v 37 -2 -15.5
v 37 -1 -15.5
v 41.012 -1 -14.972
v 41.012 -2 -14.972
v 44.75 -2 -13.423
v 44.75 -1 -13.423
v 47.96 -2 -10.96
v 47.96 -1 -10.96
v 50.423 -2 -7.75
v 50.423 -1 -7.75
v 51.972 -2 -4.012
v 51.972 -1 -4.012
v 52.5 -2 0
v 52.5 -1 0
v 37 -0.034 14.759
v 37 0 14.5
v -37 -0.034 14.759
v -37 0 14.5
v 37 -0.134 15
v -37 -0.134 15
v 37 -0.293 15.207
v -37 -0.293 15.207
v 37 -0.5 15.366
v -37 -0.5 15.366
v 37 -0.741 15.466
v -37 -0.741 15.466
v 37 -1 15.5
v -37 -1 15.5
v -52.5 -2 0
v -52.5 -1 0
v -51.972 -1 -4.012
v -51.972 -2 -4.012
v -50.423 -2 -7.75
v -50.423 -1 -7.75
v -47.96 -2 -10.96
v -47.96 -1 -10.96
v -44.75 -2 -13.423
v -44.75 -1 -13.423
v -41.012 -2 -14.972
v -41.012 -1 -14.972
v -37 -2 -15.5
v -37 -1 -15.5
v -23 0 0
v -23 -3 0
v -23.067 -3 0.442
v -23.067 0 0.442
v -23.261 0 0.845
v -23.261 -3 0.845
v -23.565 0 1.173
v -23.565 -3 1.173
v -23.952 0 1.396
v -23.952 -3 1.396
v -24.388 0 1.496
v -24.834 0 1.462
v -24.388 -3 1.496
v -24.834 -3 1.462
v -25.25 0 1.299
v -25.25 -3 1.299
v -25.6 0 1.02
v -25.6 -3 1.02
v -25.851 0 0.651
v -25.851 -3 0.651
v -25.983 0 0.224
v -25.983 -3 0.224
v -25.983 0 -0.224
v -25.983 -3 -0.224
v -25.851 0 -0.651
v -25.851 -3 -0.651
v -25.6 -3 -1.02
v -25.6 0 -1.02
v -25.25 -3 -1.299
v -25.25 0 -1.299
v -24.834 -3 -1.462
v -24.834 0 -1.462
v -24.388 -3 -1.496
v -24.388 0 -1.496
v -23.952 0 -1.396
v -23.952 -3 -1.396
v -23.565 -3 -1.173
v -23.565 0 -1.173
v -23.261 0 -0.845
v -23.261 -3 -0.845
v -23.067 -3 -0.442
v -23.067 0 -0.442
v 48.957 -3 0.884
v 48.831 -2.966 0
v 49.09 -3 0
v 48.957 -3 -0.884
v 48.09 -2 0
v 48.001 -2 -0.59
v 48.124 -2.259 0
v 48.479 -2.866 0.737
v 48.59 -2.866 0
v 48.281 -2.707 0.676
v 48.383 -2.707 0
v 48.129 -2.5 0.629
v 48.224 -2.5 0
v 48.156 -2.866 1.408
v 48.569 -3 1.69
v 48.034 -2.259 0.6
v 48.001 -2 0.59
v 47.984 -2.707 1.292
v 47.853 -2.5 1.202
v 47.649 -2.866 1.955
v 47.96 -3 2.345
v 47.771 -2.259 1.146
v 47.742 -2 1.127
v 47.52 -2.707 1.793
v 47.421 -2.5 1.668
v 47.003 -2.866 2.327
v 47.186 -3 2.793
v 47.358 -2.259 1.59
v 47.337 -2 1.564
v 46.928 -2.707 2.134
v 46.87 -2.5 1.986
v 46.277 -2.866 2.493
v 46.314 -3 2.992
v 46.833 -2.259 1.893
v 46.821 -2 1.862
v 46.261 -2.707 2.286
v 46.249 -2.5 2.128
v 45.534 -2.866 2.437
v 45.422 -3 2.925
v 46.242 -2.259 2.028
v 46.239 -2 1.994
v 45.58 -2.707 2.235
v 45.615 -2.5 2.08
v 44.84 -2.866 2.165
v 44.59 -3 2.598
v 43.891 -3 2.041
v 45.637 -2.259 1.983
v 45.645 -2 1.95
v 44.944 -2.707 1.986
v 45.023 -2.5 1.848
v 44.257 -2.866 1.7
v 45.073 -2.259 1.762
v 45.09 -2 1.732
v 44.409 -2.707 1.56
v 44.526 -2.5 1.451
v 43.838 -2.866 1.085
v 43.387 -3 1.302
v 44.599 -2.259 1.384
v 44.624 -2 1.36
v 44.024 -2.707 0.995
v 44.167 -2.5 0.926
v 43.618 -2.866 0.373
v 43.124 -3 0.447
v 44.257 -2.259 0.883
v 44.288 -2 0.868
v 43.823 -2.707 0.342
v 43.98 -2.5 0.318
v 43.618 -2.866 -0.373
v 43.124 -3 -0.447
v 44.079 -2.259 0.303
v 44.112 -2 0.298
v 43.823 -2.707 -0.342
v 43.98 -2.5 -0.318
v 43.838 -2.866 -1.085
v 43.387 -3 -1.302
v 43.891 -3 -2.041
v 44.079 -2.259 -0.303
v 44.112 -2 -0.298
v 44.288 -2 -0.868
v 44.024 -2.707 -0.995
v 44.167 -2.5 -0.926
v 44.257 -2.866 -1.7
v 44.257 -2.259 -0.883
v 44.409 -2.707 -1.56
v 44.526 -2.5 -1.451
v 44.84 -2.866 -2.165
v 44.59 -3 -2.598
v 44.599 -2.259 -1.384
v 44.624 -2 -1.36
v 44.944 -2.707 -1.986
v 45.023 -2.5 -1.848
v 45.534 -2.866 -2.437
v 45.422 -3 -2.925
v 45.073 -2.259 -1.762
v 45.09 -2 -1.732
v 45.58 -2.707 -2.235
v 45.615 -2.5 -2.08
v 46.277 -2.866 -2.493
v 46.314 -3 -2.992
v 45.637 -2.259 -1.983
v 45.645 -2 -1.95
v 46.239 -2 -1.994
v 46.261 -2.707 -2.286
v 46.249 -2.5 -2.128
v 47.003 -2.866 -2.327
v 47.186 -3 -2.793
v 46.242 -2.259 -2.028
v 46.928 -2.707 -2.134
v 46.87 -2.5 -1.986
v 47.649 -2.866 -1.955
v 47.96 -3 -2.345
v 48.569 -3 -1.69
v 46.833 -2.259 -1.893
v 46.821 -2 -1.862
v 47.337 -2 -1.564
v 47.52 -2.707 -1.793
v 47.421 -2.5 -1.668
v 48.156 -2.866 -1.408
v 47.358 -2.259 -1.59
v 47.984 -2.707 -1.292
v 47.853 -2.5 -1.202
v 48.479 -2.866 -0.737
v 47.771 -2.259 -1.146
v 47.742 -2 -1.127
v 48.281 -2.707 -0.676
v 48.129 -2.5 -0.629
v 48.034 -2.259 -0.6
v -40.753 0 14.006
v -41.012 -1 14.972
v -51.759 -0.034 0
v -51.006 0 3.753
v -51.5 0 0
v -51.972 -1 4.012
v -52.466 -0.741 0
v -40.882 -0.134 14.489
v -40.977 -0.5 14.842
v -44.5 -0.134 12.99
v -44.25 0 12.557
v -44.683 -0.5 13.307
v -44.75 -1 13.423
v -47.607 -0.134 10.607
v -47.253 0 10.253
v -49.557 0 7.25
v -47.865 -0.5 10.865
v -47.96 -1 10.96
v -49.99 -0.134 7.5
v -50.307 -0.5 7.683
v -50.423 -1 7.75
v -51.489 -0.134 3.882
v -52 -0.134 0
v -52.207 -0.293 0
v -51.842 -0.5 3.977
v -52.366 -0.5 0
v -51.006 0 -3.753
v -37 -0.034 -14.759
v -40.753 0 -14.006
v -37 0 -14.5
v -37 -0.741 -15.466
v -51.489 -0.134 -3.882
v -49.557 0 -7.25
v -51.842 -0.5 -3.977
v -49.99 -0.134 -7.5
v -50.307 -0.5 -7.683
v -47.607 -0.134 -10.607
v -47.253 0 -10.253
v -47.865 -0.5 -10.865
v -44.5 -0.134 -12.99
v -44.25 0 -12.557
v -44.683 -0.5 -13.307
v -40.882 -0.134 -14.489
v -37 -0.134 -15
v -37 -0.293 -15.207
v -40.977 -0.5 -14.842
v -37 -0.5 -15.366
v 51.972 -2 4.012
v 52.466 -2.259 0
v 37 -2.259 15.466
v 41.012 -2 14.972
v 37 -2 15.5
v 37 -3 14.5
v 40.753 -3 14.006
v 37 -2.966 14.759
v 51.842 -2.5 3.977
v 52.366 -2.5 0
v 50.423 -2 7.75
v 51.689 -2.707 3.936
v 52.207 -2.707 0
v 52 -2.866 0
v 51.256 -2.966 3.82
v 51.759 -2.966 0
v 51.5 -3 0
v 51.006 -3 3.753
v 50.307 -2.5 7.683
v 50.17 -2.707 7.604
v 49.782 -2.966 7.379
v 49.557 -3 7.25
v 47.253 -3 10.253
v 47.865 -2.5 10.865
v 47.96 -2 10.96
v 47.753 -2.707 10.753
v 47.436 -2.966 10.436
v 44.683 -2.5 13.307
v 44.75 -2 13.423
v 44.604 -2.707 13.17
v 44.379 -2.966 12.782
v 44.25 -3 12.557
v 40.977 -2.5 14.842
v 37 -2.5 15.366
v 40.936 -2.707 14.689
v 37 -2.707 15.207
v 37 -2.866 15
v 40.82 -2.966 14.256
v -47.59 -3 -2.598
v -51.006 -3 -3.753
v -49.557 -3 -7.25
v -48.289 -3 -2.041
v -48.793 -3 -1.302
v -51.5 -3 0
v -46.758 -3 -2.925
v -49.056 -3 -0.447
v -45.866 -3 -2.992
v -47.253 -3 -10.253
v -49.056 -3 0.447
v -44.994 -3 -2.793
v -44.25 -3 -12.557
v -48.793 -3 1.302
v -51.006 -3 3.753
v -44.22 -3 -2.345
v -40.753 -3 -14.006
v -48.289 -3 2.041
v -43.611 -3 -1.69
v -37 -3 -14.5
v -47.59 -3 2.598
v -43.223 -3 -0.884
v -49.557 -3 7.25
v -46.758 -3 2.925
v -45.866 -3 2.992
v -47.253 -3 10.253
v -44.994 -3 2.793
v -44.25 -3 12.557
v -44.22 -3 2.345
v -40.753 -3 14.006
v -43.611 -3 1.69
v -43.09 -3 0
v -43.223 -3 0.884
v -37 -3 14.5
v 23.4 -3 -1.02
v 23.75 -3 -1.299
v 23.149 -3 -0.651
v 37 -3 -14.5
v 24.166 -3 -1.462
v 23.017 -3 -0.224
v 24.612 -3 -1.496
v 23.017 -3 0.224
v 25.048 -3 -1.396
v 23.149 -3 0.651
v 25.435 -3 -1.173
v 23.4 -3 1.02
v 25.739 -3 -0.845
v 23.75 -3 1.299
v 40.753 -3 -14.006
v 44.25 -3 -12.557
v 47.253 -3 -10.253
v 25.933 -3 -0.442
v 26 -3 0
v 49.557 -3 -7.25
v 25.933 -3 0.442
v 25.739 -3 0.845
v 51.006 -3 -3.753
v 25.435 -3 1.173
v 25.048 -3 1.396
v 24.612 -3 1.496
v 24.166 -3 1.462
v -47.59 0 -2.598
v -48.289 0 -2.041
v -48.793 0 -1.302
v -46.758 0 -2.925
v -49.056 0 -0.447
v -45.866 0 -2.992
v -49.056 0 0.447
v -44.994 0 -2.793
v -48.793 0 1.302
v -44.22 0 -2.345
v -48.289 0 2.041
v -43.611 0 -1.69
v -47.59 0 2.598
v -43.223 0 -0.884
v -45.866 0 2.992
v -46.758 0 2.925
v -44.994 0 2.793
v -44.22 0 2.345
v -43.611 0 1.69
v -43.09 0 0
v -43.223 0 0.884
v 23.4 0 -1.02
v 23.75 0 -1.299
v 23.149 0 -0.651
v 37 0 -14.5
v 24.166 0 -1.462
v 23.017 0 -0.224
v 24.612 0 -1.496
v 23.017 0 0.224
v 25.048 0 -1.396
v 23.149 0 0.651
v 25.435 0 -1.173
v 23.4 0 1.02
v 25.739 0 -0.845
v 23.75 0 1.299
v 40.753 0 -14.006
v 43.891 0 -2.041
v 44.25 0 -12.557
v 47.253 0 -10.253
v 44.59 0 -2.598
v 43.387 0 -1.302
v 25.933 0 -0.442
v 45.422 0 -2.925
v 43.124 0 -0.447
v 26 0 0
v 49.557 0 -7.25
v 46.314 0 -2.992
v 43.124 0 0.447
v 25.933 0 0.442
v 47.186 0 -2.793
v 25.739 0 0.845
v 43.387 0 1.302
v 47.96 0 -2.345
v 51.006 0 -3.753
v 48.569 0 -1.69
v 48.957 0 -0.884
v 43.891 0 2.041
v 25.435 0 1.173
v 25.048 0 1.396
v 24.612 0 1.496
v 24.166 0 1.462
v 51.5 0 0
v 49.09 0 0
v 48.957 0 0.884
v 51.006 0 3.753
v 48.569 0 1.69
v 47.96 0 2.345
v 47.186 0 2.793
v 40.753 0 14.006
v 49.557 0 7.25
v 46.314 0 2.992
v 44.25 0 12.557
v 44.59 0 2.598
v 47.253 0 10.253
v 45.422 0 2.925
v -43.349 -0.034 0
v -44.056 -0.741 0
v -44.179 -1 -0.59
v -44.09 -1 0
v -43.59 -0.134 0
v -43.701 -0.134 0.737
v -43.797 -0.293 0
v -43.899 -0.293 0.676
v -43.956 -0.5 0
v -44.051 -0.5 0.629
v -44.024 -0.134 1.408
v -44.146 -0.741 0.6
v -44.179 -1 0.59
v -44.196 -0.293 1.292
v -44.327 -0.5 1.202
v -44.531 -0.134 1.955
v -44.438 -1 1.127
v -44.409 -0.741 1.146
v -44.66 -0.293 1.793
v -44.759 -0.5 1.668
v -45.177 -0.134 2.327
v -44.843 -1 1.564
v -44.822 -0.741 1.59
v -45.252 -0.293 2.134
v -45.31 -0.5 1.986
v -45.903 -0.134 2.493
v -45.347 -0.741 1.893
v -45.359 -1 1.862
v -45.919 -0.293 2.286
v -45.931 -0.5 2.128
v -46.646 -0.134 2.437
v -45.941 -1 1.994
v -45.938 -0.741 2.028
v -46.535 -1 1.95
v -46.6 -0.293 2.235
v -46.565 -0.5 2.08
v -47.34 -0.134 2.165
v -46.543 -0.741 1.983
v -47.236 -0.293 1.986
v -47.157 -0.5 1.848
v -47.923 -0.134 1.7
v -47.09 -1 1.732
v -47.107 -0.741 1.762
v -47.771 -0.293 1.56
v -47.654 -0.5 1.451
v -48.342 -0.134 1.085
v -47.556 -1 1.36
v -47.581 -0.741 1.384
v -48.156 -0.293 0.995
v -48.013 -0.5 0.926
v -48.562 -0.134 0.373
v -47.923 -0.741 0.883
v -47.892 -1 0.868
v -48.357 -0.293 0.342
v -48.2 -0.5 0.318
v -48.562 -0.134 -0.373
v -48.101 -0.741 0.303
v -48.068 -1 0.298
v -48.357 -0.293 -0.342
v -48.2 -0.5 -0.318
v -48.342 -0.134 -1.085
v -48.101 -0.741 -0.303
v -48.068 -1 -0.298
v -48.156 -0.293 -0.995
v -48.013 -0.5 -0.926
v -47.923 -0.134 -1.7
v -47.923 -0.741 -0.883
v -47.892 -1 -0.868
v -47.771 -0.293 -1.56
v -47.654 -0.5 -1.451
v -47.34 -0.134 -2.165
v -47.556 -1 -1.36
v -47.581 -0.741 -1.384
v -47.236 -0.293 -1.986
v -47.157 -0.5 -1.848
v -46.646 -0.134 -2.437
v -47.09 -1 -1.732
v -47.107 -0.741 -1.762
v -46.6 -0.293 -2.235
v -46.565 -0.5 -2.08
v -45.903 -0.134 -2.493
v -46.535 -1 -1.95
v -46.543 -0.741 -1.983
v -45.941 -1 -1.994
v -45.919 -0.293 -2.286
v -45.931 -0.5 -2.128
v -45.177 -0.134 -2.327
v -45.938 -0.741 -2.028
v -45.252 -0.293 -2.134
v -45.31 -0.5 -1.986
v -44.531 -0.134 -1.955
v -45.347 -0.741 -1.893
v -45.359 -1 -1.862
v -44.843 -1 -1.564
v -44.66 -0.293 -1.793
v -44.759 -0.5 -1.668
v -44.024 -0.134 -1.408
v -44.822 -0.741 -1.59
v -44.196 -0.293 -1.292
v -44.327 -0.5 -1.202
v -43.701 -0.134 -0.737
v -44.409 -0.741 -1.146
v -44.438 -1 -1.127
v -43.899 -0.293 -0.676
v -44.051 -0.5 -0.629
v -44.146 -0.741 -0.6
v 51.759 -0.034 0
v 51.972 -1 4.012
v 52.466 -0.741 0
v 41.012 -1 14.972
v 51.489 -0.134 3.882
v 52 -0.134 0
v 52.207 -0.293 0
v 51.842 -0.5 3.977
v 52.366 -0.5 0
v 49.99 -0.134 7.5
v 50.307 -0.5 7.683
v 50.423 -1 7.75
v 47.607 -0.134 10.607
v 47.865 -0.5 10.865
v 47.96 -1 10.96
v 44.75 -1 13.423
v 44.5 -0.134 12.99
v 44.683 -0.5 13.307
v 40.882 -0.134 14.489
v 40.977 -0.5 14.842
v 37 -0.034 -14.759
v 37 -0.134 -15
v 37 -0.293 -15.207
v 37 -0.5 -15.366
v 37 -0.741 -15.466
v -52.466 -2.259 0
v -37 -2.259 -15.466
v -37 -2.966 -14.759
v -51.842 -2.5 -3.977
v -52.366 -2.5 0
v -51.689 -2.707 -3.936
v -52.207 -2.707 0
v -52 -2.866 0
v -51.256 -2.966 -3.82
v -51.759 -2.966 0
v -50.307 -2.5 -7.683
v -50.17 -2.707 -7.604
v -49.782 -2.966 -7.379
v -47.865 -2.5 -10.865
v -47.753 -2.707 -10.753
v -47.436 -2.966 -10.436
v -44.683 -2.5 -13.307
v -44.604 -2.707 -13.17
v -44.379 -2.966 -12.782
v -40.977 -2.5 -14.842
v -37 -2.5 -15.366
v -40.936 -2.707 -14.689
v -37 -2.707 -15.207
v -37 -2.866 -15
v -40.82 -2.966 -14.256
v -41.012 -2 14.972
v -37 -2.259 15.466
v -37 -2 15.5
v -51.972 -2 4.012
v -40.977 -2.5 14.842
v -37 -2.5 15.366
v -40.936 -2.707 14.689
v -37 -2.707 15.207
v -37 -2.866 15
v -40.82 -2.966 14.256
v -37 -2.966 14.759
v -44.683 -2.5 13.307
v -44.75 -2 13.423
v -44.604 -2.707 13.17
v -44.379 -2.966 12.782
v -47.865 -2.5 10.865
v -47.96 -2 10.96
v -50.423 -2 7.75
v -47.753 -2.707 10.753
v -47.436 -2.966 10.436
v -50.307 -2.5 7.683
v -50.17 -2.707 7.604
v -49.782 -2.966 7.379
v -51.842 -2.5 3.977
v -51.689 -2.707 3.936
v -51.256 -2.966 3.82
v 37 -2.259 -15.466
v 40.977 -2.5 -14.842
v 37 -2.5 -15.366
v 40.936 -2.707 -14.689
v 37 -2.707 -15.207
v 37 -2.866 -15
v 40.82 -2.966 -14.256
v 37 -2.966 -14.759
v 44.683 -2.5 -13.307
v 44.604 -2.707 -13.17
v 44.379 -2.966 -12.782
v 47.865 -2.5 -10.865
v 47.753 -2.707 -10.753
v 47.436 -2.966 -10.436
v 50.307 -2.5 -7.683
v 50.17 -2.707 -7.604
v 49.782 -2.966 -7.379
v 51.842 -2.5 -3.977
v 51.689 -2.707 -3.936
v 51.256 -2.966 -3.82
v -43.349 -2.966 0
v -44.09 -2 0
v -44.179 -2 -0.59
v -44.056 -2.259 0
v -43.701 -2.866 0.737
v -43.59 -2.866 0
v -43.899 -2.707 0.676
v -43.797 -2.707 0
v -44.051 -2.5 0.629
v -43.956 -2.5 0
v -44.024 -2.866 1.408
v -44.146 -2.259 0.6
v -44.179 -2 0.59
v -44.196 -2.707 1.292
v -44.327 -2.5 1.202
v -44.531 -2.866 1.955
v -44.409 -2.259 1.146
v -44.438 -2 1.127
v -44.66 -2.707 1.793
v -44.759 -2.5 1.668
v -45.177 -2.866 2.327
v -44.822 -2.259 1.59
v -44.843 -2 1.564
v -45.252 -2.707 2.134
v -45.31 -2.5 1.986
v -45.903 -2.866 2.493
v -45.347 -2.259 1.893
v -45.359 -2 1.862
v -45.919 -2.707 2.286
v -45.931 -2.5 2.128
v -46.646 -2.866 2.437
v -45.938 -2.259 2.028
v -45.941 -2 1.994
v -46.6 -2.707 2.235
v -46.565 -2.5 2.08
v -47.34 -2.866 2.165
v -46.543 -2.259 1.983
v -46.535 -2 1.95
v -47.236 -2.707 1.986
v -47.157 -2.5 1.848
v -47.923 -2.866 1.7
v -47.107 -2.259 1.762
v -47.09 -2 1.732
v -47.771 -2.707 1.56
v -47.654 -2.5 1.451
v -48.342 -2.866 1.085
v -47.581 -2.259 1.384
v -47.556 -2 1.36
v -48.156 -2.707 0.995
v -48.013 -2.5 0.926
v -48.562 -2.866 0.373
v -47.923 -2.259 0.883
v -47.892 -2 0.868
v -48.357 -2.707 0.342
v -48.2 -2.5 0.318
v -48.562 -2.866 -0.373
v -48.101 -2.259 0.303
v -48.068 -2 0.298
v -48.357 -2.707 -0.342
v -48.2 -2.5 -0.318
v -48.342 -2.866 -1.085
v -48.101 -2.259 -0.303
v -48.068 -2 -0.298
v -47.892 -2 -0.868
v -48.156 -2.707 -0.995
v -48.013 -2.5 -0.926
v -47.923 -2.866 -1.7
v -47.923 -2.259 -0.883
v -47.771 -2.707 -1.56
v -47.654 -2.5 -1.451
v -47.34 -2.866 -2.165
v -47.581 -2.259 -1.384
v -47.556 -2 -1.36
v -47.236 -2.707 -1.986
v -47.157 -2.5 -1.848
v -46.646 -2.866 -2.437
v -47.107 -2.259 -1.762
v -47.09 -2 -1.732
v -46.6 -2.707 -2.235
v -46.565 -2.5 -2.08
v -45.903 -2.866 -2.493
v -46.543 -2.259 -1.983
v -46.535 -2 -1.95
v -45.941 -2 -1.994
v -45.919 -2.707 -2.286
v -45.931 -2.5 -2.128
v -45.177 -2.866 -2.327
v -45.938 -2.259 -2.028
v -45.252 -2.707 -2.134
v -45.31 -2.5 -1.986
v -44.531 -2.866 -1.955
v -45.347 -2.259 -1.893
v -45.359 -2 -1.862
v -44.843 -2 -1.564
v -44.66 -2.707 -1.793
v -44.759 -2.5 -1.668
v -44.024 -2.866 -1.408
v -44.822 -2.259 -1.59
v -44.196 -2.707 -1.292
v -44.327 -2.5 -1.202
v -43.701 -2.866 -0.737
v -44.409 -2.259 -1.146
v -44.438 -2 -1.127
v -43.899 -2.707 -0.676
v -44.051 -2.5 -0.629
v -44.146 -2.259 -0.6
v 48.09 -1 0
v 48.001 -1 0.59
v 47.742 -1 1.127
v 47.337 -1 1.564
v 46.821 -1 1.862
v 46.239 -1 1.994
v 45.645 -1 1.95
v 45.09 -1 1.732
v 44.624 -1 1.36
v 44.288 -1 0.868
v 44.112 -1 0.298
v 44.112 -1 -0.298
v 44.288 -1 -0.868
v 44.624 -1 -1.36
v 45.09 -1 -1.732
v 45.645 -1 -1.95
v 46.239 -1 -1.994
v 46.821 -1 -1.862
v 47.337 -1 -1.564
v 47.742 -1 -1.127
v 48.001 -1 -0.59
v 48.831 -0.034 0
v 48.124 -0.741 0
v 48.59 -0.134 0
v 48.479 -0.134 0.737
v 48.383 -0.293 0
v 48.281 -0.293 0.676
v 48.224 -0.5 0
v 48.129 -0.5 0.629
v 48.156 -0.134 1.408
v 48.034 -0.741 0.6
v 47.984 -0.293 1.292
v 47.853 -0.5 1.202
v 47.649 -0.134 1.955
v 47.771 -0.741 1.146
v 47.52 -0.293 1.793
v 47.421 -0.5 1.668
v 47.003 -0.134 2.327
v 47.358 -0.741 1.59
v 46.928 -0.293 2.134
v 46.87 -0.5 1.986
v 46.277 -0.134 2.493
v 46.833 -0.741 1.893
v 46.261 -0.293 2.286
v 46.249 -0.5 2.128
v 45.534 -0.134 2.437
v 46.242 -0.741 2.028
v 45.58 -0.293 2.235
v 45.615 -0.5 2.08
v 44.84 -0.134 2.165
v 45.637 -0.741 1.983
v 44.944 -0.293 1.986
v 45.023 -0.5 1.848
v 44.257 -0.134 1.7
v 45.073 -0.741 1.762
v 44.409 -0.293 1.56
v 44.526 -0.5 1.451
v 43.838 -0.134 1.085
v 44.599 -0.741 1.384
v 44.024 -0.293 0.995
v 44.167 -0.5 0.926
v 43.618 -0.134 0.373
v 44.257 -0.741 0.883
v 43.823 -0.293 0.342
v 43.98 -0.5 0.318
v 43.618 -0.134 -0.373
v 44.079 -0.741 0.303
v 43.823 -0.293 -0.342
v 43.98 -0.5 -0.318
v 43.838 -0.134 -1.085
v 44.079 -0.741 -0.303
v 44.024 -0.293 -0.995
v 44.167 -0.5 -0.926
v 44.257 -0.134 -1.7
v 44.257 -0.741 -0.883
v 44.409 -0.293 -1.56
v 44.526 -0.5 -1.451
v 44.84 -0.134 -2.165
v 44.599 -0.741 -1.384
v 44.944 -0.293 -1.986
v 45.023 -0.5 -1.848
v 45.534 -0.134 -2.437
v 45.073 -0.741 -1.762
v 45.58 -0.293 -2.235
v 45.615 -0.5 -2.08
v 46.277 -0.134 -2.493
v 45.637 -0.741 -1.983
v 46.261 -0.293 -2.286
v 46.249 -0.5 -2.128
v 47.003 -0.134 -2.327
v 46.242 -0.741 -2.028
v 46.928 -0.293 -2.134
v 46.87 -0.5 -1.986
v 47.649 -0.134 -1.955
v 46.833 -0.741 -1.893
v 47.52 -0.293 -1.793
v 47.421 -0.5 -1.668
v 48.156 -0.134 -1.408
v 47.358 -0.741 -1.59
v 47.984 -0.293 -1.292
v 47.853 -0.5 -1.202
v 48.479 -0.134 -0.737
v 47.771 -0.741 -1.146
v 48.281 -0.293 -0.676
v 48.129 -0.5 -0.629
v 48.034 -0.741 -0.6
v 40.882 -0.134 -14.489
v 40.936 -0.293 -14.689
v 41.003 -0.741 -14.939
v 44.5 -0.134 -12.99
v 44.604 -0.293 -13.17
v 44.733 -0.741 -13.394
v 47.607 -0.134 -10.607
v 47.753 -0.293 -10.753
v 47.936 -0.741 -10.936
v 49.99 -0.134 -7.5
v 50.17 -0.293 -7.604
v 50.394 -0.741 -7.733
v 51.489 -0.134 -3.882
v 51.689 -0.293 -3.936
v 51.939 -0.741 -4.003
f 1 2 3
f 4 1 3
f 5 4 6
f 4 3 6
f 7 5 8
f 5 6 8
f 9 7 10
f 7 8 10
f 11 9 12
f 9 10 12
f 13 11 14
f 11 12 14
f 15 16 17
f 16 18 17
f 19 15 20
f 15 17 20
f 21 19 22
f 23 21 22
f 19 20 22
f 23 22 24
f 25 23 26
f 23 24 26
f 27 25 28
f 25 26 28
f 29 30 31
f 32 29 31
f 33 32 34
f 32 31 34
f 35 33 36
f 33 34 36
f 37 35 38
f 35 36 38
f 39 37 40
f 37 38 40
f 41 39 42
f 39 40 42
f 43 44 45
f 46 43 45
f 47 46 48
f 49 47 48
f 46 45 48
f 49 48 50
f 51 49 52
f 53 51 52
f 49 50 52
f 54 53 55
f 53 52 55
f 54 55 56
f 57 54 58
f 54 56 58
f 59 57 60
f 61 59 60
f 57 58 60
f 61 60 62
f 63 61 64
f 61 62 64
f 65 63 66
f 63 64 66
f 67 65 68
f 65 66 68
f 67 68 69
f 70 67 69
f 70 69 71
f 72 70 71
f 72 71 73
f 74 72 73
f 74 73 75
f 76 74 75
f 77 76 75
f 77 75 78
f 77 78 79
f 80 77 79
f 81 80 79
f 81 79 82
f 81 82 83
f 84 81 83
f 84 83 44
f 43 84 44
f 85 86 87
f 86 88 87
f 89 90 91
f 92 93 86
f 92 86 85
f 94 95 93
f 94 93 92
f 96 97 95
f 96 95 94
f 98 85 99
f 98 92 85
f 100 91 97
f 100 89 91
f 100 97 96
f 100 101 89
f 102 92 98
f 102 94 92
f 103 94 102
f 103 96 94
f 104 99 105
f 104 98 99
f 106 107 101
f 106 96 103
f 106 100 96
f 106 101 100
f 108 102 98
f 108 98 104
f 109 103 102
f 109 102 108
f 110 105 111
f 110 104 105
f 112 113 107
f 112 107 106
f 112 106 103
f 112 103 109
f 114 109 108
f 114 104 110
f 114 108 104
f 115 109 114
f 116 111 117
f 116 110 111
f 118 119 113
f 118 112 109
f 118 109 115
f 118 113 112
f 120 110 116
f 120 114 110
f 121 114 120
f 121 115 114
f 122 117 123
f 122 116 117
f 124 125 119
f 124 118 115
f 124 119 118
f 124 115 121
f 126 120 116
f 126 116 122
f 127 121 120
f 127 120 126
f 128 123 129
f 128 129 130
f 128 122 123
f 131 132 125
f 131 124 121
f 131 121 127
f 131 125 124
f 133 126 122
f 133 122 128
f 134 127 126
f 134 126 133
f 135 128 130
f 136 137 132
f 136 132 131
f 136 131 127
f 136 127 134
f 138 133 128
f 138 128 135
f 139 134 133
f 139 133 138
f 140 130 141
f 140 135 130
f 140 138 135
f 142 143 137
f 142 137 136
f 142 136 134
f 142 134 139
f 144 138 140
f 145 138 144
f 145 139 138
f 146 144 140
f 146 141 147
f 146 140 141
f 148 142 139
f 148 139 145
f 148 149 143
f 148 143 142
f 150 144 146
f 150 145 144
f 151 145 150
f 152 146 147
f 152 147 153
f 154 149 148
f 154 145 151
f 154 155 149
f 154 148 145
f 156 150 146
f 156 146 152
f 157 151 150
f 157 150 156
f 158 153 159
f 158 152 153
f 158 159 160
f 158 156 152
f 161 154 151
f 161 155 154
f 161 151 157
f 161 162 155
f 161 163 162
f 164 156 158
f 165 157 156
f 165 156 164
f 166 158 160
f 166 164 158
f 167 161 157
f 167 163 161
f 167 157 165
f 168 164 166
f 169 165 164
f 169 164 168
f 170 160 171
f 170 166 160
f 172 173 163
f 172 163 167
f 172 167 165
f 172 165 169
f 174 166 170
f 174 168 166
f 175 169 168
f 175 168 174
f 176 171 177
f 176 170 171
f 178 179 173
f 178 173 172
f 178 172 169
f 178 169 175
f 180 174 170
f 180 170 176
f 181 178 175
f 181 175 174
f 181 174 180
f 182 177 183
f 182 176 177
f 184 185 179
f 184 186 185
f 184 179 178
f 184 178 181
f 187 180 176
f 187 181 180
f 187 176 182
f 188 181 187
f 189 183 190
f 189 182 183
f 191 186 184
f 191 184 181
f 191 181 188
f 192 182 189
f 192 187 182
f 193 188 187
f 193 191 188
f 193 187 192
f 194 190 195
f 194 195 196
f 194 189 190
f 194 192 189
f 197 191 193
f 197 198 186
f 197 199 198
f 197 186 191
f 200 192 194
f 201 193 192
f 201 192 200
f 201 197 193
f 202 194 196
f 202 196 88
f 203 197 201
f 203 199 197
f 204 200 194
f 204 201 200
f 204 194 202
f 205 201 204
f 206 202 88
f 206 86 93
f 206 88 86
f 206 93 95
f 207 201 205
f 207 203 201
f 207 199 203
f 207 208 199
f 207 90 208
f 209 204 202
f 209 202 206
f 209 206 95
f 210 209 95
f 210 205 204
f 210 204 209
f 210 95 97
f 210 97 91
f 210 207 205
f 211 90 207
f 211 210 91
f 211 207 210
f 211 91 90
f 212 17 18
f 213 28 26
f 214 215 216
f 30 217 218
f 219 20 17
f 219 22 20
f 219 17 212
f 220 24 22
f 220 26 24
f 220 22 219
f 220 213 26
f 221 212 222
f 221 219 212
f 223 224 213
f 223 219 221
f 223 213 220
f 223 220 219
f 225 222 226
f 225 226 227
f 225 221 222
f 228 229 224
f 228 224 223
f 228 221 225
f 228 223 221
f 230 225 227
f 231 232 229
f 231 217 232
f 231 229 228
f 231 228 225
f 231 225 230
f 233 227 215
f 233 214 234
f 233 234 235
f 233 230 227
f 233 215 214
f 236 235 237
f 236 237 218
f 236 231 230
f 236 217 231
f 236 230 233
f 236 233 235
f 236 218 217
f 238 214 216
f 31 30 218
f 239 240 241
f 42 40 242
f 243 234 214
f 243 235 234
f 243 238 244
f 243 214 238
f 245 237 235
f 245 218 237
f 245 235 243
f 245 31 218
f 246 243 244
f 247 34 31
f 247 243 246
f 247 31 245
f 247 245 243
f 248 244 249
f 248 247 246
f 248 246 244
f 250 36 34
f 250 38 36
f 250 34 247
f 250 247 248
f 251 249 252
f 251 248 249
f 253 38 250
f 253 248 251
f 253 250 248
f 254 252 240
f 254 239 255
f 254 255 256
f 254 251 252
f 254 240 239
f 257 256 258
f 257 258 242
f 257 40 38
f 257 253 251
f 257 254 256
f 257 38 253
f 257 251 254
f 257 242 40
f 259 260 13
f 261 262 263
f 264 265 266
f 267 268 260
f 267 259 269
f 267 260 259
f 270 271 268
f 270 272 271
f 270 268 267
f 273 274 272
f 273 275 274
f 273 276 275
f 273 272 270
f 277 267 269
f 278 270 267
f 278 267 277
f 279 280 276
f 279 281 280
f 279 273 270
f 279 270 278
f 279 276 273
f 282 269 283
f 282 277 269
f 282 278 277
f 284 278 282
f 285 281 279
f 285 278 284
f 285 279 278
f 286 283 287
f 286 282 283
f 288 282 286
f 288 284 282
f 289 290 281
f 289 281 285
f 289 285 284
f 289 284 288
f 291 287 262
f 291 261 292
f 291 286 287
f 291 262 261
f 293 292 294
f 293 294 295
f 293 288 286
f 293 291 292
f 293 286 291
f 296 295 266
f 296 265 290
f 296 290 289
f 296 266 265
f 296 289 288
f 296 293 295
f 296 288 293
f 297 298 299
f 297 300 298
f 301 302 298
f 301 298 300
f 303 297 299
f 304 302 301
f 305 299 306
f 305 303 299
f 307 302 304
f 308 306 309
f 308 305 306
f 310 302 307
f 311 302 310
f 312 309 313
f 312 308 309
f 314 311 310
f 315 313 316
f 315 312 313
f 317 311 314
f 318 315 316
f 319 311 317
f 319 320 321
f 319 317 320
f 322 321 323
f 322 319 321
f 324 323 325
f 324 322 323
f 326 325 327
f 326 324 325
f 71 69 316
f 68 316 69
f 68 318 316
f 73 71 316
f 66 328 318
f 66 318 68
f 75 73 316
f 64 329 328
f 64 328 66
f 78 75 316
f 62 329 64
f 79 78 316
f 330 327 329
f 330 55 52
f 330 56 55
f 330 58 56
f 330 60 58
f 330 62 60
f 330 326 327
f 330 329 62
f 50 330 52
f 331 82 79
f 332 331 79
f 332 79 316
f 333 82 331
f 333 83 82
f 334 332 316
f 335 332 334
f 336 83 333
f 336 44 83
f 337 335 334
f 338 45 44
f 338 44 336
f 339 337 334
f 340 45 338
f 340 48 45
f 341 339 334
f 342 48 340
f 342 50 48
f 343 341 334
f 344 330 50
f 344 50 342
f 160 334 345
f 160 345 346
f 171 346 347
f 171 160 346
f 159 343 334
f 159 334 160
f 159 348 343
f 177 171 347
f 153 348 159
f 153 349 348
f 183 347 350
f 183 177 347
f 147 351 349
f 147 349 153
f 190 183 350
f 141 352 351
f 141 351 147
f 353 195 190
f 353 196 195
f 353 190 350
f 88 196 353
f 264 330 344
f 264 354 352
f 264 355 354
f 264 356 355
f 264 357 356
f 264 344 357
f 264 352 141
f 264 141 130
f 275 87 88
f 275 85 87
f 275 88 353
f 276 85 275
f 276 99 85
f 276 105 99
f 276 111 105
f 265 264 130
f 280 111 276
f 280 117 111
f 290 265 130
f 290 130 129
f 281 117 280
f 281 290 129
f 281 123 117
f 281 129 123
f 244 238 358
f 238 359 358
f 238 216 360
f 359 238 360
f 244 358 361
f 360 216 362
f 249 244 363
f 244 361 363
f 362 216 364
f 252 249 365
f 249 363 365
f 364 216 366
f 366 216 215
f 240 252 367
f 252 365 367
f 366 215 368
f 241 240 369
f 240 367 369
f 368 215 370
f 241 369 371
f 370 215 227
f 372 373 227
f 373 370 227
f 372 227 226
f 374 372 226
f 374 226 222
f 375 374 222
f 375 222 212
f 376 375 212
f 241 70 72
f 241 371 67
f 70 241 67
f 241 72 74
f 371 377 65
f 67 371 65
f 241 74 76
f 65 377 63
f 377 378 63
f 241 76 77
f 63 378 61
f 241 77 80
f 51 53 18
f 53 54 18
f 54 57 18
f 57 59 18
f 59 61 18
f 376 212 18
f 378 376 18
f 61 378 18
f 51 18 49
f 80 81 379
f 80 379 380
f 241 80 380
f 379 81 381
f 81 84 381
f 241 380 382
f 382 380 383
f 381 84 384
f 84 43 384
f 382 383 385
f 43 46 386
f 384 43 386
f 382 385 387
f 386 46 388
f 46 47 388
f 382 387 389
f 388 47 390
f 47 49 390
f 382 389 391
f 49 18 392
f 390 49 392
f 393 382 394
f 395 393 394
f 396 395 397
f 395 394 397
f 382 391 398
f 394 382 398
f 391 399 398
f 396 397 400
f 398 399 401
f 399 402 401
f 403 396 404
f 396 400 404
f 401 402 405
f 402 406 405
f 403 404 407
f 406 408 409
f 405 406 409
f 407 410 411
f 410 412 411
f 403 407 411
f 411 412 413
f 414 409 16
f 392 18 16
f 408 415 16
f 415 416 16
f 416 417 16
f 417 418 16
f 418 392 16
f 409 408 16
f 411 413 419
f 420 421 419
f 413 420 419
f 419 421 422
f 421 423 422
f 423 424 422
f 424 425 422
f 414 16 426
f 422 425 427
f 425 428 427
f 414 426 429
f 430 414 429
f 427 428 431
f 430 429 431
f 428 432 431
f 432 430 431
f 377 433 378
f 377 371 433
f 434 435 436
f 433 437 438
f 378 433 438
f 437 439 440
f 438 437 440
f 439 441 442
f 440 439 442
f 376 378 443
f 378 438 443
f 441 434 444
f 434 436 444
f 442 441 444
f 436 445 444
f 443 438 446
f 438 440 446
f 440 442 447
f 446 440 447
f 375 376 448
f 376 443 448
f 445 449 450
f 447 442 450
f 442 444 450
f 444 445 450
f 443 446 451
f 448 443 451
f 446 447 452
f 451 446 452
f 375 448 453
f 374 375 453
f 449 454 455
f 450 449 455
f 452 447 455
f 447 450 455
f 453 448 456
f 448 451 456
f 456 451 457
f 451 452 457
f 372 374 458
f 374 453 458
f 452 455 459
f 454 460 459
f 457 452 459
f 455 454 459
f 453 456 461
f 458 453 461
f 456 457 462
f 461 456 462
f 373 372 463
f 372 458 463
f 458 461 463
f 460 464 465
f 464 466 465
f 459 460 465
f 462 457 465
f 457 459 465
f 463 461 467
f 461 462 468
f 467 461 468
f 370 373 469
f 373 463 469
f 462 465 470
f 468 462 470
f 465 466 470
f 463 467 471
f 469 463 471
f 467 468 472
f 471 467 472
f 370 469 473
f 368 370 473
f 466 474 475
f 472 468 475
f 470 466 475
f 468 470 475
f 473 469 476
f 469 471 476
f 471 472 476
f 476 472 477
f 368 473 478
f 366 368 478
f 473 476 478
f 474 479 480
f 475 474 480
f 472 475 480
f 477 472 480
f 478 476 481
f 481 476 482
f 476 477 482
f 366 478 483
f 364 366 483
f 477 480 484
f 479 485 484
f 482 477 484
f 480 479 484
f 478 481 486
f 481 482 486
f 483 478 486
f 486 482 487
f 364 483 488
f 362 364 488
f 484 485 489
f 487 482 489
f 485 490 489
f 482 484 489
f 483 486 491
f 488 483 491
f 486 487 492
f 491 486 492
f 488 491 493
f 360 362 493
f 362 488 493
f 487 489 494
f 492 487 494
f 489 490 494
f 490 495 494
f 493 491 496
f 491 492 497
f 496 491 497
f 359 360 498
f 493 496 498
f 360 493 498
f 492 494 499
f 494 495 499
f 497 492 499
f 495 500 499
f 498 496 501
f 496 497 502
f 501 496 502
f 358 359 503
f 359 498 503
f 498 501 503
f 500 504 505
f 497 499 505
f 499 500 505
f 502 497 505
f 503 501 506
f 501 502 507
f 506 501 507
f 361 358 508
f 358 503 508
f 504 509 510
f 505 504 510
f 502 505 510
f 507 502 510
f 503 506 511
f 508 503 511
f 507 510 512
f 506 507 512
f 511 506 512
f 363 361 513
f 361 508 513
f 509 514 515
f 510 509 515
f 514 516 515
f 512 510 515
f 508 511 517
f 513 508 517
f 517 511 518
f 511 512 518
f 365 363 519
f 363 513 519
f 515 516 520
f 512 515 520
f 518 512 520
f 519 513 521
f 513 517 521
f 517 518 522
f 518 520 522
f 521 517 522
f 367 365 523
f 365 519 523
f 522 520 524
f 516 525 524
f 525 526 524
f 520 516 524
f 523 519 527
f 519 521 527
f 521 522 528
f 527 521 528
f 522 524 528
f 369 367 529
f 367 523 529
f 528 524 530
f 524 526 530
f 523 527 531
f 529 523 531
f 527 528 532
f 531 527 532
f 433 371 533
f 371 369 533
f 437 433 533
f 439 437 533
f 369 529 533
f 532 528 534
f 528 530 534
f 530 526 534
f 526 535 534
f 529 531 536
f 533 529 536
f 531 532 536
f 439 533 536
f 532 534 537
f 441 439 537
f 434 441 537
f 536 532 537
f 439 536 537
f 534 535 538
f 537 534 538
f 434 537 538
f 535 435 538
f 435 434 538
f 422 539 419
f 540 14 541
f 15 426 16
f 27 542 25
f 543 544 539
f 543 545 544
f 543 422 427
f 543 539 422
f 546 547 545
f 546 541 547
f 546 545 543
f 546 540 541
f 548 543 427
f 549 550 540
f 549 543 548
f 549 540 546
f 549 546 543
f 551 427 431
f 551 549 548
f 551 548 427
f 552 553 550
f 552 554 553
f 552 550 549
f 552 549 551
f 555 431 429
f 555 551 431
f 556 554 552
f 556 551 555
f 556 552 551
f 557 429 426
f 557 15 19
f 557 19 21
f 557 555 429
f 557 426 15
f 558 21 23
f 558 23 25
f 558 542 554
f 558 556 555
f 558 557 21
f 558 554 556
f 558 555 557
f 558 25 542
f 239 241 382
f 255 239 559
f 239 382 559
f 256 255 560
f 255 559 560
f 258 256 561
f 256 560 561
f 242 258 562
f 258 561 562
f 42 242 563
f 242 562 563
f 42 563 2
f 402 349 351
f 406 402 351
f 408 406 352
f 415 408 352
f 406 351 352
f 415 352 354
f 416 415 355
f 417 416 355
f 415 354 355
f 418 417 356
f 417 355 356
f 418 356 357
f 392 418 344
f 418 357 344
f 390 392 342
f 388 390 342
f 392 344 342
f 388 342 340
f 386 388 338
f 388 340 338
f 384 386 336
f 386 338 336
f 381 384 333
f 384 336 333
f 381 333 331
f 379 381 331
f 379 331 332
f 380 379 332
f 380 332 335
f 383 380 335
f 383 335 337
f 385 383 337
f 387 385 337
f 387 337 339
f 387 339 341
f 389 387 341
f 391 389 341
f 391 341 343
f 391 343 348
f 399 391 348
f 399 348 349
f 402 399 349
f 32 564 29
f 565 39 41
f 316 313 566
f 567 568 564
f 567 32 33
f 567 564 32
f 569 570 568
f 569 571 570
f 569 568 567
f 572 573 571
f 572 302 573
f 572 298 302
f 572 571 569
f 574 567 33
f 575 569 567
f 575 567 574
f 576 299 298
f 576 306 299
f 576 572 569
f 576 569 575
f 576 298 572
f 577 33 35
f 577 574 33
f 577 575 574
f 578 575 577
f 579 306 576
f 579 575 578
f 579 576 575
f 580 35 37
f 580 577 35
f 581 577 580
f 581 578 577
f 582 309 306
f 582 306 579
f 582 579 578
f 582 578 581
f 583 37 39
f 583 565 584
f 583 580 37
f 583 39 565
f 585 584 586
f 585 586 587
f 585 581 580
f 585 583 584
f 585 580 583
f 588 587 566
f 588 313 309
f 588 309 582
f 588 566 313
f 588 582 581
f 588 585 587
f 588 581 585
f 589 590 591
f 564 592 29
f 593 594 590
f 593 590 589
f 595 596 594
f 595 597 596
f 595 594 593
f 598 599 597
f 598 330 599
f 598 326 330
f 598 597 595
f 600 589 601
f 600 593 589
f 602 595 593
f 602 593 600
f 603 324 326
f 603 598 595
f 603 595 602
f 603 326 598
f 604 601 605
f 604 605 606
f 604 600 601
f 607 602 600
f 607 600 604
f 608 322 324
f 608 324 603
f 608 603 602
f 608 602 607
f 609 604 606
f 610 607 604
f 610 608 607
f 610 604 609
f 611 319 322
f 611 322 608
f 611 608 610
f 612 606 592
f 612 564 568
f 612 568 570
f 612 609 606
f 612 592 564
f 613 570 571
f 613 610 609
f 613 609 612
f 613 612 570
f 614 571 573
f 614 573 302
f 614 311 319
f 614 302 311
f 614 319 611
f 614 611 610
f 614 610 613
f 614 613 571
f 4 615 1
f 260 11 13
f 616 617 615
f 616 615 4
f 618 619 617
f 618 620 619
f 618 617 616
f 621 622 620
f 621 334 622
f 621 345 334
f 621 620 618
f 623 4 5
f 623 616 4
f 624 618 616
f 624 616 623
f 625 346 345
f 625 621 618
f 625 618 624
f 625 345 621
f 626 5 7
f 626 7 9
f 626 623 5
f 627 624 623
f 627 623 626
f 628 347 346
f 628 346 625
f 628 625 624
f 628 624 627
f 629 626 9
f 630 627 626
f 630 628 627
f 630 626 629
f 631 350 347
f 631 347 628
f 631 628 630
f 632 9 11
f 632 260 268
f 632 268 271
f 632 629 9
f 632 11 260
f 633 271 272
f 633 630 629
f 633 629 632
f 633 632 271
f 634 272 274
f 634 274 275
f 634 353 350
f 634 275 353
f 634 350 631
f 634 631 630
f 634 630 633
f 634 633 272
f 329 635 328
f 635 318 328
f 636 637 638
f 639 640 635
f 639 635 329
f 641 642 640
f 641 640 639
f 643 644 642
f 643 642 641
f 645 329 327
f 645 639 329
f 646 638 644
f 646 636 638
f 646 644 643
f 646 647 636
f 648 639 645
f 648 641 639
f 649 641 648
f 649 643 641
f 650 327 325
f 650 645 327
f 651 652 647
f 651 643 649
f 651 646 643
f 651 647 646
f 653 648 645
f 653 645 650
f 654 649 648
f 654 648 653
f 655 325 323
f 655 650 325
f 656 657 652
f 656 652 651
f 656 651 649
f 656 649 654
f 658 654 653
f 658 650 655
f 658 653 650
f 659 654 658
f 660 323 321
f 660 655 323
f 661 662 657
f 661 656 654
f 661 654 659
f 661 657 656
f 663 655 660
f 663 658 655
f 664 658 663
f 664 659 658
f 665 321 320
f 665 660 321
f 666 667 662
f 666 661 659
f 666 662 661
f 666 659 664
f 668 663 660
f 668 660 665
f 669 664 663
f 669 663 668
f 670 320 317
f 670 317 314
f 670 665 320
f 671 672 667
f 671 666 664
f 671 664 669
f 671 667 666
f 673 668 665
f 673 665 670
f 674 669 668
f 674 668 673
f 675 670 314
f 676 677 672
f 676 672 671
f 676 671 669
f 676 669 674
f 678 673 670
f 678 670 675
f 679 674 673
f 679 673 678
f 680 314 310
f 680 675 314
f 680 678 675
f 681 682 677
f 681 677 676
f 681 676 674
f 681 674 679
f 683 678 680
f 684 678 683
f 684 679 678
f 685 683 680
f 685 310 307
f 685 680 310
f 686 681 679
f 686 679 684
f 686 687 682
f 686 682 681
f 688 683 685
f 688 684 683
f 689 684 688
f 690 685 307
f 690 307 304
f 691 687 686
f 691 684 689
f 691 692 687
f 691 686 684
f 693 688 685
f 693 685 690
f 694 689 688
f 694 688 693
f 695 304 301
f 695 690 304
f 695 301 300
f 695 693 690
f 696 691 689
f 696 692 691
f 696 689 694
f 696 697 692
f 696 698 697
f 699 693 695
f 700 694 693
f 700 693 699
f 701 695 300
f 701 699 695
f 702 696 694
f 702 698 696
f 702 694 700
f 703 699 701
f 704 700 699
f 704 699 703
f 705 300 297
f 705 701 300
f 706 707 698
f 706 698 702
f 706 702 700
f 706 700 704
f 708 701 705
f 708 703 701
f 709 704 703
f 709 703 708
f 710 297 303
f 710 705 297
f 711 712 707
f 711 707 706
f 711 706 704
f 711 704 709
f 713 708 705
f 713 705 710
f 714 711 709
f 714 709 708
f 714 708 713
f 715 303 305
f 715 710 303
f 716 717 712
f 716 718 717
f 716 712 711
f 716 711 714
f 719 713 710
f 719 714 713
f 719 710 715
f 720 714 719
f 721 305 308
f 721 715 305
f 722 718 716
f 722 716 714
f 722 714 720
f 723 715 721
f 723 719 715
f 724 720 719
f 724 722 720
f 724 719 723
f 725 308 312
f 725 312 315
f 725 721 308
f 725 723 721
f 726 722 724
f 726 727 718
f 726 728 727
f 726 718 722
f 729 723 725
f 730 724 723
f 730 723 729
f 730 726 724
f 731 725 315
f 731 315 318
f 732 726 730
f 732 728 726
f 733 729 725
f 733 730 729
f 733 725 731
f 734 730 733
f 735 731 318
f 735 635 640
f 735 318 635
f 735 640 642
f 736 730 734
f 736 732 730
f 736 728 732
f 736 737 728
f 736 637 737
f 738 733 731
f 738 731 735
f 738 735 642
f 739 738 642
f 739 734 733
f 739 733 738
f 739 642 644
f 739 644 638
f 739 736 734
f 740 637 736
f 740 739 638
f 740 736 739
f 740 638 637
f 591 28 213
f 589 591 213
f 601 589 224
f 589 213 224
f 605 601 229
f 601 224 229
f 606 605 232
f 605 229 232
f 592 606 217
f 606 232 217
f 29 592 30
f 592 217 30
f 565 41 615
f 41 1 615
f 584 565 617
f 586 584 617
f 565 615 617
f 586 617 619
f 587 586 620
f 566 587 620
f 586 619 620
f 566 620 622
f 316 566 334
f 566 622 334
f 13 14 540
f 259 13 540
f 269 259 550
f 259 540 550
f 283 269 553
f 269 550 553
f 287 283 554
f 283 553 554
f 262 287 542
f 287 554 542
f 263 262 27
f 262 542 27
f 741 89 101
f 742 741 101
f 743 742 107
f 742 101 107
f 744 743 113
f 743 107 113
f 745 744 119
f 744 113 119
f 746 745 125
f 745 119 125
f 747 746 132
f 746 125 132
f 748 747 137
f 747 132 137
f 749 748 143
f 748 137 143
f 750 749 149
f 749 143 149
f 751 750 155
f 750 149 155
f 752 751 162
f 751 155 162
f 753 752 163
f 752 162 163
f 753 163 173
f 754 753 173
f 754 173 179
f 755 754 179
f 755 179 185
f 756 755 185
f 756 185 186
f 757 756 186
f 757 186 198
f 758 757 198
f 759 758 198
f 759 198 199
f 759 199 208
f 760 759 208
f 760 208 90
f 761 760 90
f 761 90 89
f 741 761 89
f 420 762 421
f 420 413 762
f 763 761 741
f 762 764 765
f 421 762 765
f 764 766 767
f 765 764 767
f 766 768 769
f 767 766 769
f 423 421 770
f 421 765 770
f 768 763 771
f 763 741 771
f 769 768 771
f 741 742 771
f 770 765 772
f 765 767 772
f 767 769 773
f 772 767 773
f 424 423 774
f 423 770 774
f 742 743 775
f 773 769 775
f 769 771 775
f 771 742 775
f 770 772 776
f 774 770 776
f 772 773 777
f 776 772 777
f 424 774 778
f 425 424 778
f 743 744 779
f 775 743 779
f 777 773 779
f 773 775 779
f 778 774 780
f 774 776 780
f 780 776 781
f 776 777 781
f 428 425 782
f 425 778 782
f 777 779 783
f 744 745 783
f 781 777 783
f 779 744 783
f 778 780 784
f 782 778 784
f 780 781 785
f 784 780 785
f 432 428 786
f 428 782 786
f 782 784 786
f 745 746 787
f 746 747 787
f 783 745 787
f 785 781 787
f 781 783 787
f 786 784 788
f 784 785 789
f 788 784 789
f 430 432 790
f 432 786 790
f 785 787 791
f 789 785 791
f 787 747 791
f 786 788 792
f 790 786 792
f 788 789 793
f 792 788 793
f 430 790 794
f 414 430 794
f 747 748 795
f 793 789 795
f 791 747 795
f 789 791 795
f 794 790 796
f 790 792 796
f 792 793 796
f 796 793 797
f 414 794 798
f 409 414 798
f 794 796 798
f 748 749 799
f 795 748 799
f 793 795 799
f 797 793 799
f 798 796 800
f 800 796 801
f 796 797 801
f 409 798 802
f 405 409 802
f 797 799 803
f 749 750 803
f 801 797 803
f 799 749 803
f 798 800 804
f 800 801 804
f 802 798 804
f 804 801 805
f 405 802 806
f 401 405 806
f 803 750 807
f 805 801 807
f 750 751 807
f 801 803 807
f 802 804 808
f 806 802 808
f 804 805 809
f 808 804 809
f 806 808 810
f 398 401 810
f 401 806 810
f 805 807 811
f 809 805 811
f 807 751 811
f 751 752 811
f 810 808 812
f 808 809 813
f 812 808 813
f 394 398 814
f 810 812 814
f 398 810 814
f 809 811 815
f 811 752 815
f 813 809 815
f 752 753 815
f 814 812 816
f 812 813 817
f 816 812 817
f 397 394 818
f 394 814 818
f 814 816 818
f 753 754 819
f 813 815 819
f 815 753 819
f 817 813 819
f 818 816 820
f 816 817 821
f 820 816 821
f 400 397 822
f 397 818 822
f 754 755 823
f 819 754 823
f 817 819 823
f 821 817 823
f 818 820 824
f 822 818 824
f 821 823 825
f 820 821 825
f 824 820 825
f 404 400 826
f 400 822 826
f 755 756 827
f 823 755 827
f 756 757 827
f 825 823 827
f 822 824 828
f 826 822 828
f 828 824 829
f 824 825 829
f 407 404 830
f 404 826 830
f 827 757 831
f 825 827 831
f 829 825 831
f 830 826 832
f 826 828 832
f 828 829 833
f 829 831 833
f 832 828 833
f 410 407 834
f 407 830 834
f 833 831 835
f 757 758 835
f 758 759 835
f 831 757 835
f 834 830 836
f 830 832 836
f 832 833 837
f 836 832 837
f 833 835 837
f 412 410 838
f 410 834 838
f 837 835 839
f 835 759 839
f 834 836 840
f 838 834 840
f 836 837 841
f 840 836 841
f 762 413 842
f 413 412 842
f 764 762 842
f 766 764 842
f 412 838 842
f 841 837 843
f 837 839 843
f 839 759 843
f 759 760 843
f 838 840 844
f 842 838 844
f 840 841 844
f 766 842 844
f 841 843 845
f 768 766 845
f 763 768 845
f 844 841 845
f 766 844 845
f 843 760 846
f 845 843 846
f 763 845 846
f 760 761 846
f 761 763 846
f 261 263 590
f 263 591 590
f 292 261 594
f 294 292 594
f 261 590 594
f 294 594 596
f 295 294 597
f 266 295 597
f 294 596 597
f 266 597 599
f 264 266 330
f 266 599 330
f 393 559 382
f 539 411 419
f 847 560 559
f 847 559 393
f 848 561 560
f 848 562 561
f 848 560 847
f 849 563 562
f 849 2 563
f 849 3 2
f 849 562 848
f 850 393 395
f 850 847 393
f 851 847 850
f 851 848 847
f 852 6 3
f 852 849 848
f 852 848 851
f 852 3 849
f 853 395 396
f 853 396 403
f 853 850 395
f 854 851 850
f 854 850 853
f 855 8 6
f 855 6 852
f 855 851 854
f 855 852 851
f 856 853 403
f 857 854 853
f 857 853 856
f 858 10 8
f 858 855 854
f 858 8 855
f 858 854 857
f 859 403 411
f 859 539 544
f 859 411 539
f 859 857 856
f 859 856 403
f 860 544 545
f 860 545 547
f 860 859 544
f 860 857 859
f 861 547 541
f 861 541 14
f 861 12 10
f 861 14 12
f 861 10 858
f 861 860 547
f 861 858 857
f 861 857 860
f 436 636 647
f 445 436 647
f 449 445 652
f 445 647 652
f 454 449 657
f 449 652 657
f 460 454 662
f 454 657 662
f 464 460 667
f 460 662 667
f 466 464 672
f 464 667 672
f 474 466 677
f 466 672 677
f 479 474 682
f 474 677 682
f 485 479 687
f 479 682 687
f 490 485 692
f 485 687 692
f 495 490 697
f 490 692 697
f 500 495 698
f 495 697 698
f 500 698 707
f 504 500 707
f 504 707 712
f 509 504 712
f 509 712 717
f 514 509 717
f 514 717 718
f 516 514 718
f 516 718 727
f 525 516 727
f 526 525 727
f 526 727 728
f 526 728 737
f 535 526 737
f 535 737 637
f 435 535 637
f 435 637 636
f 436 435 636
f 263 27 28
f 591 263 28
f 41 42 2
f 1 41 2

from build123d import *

# Parameters (mm, degrees)
F1_DEPTH = 3
F2_R     = 1
F3_R     = 2
F4_DEPTH = 25
F3_R_2   = 1.5
F5_DEPTH = 25
F6_R     = 1
F7_R     = 1


with BuildPart() as f1:
    # F0 (on Front) → F1 (new body)
    with BuildSketch(Plane.XZ):
        with BuildLine():
            Line((37, 15.5), (-37, 15.5))
            ThreePointArc((-37, 15.5), (-47.9601551084, 10.9601551084), (-52.5, 0))
            ThreePointArc((-52.5, 0), (-47.9601551084, -10.9601551084), (-37, -15.5))
            Line((-37, -15.5), (37, -15.5))
            ThreePointArc((37, -15.5), (47.9601551084, -10.9601551084), (52.5, 0))
            ThreePointArc((52.5, 0), (47.9601551084, 10.9601551084), (37, 15.5))
        make_face()
    extrude(amount=F1_DEPTH)

    # F2
    f2_edges = [f1.edges().sort_by_distance(p)[0] for p in [
        (-52.5, -3, 0),
        (0, -3, -15.5),
    ]]
    fillet(f2_edges, radius=F2_R)

    # F3 (on face) → F4 (cut)
    with BuildSketch(Plane.XZ.offset(3)):
        with Locations((-46.09, 0)):
            Circle(F3_R)
        with Locations((46.09, 0)):
            Circle(F3_R)
    extrude(amount=-F4_DEPTH, mode=Mode.SUBTRACT)

    # F3 (on face) → F5 (cut)
    with BuildSketch(Plane.XZ.offset(3)):
        with Locations((24.5, 0)):
            Circle(F3_R_2)
        with Locations((-24.5, 0)):
            Circle(F3_R_2)
    extrude(amount=-F5_DEPTH, mode=Mode.SUBTRACT)

    # F6
    f6_edges = [f1.edges().sort_by_distance(p)[0] for p in [
        (-48.09, -3, 0),
        (44.09, -3, 0),
        (44.09, 0, 0),
        (-48.09, 0, 0),
    ]]
    fillet(f6_edges, radius=F6_R)

    # F7
    f7_edges = [f1.edges().sort_by_distance(p)[0] for p in [
        (-52.5, 0, 0),
    ]]
    fillet(f7_edges, radius=F7_R)


solid = f1.part
